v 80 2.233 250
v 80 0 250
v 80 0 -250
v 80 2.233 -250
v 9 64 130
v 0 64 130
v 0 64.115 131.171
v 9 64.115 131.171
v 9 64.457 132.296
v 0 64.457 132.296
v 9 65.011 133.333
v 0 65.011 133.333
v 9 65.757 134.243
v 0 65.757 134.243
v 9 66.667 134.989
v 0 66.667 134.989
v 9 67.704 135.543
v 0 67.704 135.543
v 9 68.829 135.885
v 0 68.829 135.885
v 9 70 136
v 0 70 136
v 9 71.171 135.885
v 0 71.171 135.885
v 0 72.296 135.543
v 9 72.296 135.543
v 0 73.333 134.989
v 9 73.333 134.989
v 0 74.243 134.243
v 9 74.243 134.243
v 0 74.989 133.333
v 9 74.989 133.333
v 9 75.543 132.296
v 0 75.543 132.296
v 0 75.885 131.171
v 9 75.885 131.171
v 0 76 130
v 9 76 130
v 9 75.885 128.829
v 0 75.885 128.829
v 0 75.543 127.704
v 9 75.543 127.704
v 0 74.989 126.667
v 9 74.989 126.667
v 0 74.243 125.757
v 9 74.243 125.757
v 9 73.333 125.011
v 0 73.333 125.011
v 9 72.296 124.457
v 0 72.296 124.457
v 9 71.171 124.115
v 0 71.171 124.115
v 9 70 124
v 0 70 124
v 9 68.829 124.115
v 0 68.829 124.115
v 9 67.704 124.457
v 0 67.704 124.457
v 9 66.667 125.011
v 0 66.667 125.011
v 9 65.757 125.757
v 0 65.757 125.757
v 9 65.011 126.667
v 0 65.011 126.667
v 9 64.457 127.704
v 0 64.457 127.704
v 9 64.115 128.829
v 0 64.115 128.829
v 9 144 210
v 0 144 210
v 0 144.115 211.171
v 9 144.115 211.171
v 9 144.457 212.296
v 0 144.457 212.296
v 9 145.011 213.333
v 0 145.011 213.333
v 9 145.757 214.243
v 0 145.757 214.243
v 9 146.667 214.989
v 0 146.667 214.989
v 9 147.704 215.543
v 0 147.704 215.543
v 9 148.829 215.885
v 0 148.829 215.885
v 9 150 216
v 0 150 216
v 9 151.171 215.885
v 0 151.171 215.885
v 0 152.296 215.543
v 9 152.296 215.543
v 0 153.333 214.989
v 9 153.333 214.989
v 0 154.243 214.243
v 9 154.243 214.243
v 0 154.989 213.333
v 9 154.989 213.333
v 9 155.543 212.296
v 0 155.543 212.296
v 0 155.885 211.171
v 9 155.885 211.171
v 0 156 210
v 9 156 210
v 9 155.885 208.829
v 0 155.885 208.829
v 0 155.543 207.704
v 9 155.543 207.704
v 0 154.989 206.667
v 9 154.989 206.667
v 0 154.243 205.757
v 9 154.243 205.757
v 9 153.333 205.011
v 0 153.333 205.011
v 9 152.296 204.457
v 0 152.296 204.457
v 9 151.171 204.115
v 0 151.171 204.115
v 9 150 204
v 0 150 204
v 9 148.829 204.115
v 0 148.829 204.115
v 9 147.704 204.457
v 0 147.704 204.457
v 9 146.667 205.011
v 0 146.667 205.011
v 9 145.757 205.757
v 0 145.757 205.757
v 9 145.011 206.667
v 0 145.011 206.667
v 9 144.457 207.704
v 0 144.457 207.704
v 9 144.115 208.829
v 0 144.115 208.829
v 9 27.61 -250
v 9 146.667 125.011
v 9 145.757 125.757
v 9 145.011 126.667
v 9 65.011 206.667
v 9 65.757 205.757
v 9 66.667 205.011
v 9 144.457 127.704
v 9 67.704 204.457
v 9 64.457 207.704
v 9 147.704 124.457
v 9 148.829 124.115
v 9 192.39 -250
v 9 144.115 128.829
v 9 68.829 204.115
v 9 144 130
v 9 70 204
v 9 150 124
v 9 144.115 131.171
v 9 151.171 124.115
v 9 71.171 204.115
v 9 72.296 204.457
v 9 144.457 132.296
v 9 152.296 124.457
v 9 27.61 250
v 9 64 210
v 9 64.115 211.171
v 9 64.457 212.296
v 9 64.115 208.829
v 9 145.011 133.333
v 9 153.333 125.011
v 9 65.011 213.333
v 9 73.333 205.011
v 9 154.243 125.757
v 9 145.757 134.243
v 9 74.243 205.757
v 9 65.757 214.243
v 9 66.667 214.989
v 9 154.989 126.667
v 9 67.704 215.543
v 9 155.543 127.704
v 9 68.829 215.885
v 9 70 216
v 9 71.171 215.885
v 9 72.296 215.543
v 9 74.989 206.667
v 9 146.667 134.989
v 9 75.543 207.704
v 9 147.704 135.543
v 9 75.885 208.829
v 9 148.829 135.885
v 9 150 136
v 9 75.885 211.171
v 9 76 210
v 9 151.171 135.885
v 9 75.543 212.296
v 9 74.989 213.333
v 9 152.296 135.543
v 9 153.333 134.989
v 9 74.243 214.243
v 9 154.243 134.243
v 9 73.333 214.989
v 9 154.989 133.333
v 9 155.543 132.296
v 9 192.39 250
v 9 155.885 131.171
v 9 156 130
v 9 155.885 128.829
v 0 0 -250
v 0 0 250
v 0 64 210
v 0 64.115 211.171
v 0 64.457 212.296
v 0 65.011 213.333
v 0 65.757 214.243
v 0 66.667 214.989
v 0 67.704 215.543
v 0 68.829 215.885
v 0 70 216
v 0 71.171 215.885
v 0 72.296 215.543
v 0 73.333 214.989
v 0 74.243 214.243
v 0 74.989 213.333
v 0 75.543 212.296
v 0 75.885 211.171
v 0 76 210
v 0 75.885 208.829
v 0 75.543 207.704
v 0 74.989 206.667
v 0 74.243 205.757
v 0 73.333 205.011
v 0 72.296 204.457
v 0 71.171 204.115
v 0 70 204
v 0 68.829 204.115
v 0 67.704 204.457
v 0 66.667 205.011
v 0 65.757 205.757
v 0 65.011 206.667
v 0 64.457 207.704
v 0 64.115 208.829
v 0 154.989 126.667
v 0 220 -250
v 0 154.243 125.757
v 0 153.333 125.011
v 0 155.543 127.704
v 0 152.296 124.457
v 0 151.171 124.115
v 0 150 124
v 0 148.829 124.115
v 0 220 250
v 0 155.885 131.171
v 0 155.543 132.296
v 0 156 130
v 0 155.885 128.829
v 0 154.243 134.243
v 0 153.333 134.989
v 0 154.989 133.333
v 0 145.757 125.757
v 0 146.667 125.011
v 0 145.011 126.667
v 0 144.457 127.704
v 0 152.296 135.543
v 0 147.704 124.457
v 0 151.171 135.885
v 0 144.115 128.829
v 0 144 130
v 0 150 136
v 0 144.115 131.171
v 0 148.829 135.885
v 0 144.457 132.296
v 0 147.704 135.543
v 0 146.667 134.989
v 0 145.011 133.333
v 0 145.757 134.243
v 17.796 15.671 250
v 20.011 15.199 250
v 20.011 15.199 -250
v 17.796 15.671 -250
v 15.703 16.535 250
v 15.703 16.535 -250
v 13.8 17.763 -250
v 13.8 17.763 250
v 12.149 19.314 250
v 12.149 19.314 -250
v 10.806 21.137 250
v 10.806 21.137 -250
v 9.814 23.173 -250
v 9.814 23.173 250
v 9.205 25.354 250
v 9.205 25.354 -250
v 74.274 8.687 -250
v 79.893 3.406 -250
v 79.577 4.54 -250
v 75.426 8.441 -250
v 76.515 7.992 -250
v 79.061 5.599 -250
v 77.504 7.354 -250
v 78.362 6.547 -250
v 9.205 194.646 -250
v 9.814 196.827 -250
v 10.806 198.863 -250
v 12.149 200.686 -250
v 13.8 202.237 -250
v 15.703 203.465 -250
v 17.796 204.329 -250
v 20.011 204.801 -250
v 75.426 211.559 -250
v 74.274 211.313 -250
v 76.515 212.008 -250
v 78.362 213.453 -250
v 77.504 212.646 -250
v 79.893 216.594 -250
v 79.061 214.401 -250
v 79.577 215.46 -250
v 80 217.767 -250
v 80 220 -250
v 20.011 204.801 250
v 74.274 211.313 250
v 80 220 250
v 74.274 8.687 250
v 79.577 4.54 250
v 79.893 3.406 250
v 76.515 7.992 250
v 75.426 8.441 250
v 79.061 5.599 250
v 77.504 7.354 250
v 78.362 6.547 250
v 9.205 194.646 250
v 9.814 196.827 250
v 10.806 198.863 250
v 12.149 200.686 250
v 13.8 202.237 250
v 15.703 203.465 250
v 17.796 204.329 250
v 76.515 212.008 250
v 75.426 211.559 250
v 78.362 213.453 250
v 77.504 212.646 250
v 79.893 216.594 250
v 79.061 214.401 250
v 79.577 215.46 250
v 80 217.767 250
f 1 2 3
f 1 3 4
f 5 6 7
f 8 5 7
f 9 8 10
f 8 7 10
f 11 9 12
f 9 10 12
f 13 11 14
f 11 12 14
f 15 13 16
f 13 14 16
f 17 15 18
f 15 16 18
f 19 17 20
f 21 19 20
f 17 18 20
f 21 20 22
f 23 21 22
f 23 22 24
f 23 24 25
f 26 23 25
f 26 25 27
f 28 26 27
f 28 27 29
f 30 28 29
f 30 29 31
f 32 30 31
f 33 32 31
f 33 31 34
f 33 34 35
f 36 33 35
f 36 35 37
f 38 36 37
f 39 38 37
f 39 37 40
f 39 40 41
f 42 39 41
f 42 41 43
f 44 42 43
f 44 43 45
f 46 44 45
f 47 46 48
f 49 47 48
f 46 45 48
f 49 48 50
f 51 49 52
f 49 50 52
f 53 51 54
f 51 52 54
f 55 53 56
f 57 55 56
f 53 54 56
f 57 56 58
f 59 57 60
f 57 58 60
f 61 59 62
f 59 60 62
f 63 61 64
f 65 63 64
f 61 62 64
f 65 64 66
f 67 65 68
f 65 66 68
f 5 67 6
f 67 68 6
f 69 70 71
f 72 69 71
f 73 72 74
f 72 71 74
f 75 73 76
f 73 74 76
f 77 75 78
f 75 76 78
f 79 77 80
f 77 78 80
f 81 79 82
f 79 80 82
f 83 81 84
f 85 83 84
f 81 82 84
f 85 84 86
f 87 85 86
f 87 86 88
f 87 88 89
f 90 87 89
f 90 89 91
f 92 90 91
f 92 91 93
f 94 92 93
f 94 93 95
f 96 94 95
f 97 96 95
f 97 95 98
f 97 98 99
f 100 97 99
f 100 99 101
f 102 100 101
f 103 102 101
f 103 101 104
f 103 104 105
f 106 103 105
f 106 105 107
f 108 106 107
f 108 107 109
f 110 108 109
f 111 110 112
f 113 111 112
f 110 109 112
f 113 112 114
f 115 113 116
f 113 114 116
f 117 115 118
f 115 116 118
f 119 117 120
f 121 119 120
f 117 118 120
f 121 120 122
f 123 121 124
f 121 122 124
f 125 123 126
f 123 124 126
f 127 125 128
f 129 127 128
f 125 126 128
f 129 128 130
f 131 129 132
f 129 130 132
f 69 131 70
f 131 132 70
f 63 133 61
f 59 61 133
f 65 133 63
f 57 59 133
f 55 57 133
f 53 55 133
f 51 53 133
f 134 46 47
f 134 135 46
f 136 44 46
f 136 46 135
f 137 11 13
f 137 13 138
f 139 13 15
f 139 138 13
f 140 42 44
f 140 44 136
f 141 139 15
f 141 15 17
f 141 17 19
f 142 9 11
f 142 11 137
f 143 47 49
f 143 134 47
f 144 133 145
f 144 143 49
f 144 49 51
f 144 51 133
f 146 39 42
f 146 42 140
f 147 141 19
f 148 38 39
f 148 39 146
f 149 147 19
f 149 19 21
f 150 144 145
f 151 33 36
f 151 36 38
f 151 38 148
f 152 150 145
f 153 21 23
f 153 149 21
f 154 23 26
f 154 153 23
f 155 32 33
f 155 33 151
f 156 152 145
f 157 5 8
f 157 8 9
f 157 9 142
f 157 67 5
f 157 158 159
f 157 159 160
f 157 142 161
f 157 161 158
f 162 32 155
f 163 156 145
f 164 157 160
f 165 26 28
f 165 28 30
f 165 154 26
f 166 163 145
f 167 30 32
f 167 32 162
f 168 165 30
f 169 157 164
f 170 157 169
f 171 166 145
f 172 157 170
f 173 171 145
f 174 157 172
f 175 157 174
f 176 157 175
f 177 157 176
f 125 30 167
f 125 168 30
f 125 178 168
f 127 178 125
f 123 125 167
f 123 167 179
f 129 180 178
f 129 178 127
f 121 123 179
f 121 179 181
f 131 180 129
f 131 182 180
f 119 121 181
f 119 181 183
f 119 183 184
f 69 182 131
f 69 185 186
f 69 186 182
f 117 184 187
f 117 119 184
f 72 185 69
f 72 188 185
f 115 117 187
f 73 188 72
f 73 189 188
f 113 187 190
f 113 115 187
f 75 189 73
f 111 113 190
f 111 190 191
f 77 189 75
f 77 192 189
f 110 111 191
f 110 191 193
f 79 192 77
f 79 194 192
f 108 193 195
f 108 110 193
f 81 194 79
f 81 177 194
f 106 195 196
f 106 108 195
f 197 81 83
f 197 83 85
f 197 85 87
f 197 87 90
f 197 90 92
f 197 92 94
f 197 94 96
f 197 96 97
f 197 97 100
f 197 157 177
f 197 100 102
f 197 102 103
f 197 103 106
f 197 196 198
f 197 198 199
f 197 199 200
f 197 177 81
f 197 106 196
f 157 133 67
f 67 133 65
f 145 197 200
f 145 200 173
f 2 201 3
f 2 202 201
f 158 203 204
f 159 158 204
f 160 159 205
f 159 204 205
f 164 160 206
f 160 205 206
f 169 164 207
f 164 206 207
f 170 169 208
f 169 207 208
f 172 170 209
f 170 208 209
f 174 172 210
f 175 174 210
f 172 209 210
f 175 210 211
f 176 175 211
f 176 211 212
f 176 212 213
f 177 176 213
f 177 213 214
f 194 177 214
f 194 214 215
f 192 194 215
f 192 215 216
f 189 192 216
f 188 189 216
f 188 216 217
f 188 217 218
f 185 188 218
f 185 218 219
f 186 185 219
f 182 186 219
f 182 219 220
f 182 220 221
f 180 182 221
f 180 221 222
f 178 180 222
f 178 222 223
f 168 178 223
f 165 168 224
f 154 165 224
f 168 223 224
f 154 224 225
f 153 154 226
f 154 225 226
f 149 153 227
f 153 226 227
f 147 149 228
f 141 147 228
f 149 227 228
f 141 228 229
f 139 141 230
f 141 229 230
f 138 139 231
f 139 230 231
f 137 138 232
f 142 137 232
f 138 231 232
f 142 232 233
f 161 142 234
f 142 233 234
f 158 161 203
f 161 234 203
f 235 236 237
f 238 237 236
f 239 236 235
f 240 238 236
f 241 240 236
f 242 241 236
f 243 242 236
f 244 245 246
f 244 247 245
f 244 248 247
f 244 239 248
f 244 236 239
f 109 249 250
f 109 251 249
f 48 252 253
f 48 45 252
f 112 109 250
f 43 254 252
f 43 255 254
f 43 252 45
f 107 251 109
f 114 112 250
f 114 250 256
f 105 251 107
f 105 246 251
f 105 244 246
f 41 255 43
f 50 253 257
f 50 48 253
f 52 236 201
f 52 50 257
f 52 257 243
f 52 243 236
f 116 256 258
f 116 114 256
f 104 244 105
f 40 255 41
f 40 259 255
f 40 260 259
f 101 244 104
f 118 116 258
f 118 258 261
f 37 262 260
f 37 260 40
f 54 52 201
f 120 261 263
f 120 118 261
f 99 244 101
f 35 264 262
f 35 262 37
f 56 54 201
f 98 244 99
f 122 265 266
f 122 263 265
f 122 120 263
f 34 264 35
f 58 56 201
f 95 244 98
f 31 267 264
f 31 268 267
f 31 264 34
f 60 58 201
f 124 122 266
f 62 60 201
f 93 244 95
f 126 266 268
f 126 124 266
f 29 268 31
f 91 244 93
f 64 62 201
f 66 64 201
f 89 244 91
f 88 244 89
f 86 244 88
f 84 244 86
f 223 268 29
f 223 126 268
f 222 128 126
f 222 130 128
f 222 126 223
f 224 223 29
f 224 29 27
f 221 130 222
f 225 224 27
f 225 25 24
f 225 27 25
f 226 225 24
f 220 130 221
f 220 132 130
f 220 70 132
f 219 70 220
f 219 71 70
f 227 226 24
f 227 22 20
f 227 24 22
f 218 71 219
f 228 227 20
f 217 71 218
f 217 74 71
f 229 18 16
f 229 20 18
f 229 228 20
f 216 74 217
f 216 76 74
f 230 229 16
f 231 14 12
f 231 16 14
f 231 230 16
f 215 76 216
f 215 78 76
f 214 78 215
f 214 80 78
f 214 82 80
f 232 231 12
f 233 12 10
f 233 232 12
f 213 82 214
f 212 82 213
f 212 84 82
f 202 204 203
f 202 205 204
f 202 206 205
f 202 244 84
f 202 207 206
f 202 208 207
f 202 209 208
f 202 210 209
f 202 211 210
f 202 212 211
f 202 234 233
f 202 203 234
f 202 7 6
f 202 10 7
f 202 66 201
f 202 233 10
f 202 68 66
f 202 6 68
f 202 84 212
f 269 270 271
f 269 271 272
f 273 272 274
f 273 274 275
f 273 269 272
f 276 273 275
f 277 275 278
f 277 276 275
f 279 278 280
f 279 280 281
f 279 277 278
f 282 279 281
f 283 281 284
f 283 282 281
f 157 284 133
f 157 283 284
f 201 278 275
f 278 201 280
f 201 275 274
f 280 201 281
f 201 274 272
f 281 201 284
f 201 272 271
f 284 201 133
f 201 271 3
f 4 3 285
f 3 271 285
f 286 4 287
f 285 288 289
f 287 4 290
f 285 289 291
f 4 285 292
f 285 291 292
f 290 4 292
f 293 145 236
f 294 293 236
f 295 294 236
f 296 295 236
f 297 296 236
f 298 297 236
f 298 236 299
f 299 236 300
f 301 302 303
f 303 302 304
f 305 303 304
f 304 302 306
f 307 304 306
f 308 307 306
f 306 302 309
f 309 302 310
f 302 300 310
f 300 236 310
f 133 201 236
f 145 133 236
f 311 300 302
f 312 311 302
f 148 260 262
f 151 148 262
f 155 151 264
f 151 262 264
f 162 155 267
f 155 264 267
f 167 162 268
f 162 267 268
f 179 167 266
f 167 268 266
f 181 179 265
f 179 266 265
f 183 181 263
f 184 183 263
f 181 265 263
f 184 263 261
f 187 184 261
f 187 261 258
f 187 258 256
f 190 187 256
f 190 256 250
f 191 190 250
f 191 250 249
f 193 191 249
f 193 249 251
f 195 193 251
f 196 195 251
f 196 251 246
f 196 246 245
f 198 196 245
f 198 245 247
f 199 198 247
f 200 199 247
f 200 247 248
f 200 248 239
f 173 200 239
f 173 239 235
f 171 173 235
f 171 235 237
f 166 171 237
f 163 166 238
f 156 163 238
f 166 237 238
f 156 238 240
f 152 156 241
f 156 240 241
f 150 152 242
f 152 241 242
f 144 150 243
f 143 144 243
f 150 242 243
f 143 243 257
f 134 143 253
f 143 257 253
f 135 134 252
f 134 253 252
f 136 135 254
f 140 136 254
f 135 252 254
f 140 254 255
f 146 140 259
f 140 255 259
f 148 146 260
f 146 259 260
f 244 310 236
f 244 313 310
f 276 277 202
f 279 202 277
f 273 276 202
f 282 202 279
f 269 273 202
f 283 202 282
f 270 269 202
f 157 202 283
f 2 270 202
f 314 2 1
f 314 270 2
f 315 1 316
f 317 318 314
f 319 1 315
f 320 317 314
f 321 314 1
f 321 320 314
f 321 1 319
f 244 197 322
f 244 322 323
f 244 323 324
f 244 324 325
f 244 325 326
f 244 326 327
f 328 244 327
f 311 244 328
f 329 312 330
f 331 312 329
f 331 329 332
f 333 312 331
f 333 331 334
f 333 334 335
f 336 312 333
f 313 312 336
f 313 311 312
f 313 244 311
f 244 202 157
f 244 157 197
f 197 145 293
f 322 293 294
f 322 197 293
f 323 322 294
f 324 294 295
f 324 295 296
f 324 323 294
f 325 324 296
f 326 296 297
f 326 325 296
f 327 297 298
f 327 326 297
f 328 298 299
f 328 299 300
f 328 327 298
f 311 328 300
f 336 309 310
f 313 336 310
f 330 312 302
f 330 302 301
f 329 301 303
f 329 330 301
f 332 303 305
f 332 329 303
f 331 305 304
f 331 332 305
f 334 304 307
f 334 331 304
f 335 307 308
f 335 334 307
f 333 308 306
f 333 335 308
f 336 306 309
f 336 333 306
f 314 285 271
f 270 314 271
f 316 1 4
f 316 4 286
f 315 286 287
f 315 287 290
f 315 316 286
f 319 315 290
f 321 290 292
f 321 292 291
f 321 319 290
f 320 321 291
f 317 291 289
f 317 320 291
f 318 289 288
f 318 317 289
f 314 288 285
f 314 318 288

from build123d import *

# Parameters (mm, degrees)
F1_DEPTH = 250
F2_R     = 6
F3_DEPTH = 80.001


with BuildPart() as f1:
    # F0 (on Top) → F1 (new body, symmetric)
    with BuildSketch(Plane.XY):
        with BuildLine():
            Line((0, 110), (0, 0))
            Line((0, 0), (80, 0))
            Line((80, 0), (80, 2.233367))
            ThreePointArc((80, 2.233367), (78.362298, 6.547073), (74.274444, 8.687067))
            Line((74.274444, 8.687067), (20.010685, 15.198718))
            ThreePointArc((20.010685, 15.198718), (12.149427, 19.31409), (9, 27.609678))
            Line((9, 27.609678), (9, 110))
            Line((9, 110), (9, 192.390322))
            ThreePointArc((9, 192.390322), (12.149427, 200.68591), (20.010685, 204.801282))
            Line((20.010685, 204.801282), (74.274444, 211.312933))
            ThreePointArc((74.274444, 211.312933), (78.362298, 213.452927), (80, 217.766633))
            Line((80, 217.766633), (80, 220))
            Line((80, 220), (0, 220))
            Line((0, 220), (0, 110))
        make_face()
    extrude(amount=F1_DEPTH, both=True)

    # F2 (on face) → F3 (cut, through all)
    with BuildSketch(Plane(origin=(0, 0, 0), x_dir=(0, -1, 0), z_dir=(-1, 0, 0))):
        with Locations((-70, 210)):
            Circle(F2_R)
        with Locations((-150, 210)):
            Circle(F2_R)
        with Locations((-70, 130)):
            Circle(F2_R)
        with Locations((-150, 130)):
            Circle(F2_R)
    extrude(amount=-F3_DEPTH, mode=Mode.SUBTRACT)


solid = f1.part
